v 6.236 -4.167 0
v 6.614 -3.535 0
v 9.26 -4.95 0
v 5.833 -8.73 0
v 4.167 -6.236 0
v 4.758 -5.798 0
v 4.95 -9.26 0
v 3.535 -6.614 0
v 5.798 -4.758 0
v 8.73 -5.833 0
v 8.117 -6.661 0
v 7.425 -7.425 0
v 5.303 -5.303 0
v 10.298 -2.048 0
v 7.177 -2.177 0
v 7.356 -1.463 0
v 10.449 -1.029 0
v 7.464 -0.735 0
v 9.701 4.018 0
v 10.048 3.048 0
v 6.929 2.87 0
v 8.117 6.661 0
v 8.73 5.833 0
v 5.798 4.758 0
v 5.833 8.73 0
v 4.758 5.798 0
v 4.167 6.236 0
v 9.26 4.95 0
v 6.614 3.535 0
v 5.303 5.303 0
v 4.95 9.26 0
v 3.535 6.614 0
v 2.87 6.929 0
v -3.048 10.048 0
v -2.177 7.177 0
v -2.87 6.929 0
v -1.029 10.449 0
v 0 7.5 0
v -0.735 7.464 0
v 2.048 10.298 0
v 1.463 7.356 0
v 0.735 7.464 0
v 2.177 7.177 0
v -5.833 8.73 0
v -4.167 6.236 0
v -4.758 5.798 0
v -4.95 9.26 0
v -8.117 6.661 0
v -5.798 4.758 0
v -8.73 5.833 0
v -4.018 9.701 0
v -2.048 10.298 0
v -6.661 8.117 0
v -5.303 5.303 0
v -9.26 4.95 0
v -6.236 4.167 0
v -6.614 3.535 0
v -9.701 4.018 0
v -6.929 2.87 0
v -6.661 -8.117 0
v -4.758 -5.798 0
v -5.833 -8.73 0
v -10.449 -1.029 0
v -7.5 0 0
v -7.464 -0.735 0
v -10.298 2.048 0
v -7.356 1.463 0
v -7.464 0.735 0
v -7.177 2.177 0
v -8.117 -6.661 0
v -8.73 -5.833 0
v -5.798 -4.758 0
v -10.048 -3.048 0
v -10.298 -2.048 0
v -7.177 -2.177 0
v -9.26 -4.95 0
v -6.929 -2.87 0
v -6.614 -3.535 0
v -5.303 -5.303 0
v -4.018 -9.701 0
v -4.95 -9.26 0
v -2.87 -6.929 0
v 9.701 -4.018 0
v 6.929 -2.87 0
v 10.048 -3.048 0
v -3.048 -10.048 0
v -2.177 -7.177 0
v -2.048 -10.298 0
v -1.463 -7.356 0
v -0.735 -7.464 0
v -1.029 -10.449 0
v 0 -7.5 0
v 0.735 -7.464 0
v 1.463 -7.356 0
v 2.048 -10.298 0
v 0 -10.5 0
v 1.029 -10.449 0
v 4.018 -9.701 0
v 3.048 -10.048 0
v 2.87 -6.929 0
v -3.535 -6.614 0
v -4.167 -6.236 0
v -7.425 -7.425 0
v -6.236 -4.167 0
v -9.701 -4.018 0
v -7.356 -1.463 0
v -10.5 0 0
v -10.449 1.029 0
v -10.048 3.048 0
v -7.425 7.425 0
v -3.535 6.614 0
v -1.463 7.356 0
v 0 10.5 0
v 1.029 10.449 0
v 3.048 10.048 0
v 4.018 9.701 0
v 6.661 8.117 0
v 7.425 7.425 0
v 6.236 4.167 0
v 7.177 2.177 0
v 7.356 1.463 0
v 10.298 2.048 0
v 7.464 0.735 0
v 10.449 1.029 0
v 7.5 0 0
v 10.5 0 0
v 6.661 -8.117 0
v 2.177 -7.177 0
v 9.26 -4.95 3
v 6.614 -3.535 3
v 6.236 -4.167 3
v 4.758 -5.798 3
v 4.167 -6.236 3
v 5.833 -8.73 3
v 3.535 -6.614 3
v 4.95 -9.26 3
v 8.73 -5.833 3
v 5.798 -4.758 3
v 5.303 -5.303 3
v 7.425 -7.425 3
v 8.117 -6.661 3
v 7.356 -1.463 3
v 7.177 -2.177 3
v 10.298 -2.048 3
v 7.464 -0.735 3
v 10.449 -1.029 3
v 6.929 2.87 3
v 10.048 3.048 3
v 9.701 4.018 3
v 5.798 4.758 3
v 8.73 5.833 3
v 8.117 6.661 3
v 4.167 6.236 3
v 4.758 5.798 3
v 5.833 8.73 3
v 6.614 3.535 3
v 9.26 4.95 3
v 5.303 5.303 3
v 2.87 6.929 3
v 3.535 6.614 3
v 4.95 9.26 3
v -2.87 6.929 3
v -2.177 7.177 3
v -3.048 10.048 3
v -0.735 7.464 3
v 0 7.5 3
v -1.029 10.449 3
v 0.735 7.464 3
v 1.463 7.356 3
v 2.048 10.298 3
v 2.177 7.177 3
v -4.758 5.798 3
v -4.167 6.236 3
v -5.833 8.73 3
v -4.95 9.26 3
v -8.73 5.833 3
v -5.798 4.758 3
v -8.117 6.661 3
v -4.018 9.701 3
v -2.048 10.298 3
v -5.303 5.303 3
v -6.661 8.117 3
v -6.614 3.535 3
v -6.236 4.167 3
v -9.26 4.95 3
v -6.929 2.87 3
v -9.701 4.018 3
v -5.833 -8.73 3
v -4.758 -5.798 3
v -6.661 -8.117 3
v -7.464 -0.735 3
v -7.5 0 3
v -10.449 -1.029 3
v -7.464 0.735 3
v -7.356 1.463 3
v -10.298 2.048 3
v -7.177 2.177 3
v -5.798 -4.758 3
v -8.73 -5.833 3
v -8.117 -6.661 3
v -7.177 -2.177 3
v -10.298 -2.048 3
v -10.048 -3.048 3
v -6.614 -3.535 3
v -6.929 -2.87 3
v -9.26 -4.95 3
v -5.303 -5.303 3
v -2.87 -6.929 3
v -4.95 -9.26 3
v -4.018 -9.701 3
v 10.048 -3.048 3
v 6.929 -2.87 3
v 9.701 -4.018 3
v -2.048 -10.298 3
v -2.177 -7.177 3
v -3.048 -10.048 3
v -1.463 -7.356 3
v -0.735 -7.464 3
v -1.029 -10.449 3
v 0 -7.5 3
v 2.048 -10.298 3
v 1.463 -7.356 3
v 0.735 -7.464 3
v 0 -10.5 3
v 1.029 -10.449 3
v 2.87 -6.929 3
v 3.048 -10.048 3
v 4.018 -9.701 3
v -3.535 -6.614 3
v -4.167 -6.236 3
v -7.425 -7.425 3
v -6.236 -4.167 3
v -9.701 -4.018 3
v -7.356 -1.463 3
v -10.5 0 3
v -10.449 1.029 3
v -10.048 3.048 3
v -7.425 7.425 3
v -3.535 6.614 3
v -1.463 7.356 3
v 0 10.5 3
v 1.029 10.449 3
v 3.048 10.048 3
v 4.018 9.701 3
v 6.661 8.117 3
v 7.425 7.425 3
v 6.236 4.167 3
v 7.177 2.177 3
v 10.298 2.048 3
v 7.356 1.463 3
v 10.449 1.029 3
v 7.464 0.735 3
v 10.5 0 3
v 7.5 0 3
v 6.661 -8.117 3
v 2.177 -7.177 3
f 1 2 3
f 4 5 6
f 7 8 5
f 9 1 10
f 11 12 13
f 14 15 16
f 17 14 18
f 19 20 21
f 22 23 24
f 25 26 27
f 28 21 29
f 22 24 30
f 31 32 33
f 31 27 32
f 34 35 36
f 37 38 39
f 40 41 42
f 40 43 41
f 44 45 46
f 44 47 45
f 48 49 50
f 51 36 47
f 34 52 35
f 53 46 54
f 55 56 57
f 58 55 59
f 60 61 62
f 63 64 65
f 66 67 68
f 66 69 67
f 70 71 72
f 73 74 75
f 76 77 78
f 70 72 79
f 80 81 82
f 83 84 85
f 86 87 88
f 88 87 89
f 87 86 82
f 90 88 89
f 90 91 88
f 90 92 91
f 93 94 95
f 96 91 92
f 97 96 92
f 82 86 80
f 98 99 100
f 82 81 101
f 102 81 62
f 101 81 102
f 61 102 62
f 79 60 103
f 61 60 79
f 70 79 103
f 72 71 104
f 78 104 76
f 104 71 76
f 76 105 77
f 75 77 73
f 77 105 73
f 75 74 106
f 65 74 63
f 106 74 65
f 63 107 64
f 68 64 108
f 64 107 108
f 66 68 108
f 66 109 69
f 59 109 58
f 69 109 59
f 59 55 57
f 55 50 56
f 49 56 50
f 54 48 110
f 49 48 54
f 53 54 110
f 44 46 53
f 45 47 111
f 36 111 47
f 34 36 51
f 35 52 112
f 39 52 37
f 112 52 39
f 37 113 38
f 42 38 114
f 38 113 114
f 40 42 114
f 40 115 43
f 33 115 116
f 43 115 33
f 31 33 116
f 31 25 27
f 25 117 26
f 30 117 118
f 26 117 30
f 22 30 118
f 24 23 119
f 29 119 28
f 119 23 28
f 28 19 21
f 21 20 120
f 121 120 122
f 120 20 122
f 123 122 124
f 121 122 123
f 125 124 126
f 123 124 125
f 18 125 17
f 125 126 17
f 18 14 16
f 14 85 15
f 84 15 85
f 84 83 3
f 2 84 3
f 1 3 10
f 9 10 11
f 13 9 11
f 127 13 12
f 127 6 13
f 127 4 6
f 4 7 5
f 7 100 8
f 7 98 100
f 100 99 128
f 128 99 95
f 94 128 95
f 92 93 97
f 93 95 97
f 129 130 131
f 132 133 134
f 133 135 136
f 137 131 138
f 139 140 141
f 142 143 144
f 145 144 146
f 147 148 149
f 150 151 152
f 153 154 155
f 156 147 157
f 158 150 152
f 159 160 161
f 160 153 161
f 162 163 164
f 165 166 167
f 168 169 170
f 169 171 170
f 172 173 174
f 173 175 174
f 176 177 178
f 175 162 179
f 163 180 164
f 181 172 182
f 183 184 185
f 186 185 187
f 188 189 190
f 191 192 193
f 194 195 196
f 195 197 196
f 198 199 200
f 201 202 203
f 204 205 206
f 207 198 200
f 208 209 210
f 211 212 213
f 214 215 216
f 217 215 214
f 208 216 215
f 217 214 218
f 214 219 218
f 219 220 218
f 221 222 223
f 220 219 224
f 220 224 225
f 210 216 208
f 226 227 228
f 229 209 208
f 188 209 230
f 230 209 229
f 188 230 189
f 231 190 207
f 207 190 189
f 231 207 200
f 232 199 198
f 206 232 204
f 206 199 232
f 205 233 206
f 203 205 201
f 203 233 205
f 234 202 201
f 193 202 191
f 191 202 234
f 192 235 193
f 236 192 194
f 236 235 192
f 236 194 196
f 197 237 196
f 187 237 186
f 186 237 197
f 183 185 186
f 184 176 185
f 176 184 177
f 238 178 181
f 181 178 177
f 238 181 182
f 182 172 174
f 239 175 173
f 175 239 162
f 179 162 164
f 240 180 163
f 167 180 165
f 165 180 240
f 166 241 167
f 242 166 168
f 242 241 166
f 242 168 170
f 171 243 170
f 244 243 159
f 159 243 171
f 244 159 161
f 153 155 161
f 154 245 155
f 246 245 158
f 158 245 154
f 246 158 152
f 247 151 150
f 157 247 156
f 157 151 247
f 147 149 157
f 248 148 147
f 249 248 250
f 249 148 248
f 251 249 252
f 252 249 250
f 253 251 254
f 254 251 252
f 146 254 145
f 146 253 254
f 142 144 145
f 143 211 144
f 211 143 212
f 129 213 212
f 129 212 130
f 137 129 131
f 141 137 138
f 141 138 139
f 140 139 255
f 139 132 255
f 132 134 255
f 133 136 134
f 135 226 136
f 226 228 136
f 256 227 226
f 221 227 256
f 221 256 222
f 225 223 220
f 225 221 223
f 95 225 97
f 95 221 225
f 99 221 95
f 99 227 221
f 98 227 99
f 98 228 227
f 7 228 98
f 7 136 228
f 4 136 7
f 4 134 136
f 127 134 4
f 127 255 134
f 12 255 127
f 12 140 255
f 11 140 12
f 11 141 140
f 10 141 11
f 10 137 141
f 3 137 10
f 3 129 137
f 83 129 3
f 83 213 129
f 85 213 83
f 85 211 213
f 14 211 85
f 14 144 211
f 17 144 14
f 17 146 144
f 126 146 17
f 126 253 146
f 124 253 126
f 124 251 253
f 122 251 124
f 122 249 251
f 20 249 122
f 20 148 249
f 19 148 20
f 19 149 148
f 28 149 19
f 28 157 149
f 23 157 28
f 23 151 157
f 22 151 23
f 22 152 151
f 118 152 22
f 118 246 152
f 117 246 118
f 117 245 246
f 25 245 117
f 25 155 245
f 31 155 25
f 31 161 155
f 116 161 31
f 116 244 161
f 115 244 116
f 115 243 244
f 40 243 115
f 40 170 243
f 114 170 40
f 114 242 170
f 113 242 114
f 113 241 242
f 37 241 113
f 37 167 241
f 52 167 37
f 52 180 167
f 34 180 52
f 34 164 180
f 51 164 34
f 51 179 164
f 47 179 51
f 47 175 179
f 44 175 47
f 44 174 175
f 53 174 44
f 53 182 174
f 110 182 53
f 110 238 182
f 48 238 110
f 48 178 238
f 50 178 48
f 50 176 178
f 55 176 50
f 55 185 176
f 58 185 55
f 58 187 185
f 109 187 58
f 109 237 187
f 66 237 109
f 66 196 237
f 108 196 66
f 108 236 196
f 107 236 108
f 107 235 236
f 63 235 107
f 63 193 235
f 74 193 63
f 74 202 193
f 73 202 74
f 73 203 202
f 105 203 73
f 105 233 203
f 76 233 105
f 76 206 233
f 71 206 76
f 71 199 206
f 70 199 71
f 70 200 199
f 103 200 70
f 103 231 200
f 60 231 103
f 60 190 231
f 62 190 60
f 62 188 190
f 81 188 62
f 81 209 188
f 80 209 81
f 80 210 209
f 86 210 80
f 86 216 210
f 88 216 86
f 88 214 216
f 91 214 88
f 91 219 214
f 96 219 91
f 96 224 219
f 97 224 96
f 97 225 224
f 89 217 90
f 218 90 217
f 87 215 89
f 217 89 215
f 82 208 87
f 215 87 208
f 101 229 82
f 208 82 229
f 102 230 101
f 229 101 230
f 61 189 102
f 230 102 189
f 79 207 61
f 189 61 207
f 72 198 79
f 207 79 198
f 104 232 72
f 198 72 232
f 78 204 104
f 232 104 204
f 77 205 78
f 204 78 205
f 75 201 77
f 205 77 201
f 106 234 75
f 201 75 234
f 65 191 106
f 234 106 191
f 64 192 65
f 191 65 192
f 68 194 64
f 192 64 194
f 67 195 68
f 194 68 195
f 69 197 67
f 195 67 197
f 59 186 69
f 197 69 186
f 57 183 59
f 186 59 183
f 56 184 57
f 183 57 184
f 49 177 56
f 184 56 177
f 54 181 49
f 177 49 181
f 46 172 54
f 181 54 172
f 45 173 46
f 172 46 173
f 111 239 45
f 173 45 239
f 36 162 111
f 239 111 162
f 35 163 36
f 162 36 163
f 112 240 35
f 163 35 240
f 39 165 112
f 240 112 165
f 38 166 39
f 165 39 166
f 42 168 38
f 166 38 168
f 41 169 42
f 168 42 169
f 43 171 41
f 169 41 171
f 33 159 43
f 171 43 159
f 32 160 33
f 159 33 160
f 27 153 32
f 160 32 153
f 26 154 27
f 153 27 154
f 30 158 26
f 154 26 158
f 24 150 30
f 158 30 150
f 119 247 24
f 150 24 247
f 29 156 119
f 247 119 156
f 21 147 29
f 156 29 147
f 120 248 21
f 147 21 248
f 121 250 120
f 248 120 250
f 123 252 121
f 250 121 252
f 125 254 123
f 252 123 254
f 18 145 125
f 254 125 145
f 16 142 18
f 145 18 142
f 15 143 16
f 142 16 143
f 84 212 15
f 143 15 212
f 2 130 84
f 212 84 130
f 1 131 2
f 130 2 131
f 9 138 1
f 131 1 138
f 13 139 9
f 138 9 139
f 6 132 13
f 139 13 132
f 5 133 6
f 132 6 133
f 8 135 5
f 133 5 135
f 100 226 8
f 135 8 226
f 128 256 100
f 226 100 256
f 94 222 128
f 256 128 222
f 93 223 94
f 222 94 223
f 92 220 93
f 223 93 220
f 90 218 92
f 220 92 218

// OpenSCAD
// =====================================================================
// Eyelet Generator — Parametric Model Maker (PMM) Compatible
// Generates various eyelet types for outdoor & camping gear
//
// Author: Vilda (Vilém Kužel) & Klepeto
// License: CC-BY-SA-4.0
// Repository: https://github.com/vildakuzel/openscad-eyelet-generator
// =====================================================================

/* [Eyelet Type] */
// Select eyelet type
eyelet_type = 1; // [1:Simple O, 2:Simple 8, 3:Double O Egg, 4:Snowman, 5:Triangle, 6:Joined 8, 7:Joined Snowman, 8:Simple D, 9:Double D, 10:Simple S]

/* [Dimensions] */
// Wall thickness — thickness of the eyelet ring wall
wall_thickness = 3; // [1:1:10]

// Height — extrusion height of the eyelet
height = 3; // [1:1:10]

// Base inner diameter — inner diameter of the primary ring
base_o_diameter = 15; // [1:1:150]

// Second inner diameter — inner diameter of the second ring (Simple 8, Double O Egg, Snowman, Triangle, Joined 8, Simple S)
second_o_diameter = 5; // [1:1:150]

// Third inner diameter — inner diameter of the third ring (Snowman, Triangle)
third_o_diameter = 10; // [1:1:150]

/* [3D Edge Filleting] */
// Bottom edge radius — rounds the bottom edge of the eyelet
bottom_edge_fillet = 0; // [0:0.1:10]

// Top edge radius — rounds the top edge of the eyelet
top_edge_fillet = 0; // [0:0.1:10]

// Fillet resolution — number of layers for edge rounding (higher = smoother, slower)
fillet_steps = 10; // [1:1:30]

/* [2D Smoothing] */
// Connection fillet radius — rounds V-junctions where rings meet
fillet_radius = 2; // [0:0.1:10]

/* [S Shape — Hook 1] */
// Hook 1 — percentage of a full circle (larger = more closed loop)
s_arc_1_pct = 83; // [70:1:100]

/* [S Shape — Hook 2] */
// Hook 2 — percentage of a full circle (larger = more closed loop)
s_arc_2_pct = 83; // [70:1:100]

/* [Color] */
// Eyelet color
eyelet_color = "#2F80ED"; // color

/* [Hidden] */
$fn = 64;

// Derived radius values
inner_radius = base_o_diameter / 2;
outer_radius = inner_radius + wall_thickness;

second_inner_radius = second_o_diameter / 2;
second_outer_radius = second_inner_radius + wall_thickness;

third_inner_radius = third_o_diameter / 2;
third_outer_radius = third_inner_radius + wall_thickness;

// Ring center offsets (outer edges touching)
ring_offset_1 = inner_radius + wall_thickness + second_inner_radius;
ring_offset_2 = ring_offset_1 + second_inner_radius + wall_thickness + third_inner_radius;

// Joined offsets (centers closer, inner holes connected)
joined_offset_1 = inner_radius + second_inner_radius - wall_thickness;
joined_offset_2 = joined_offset_1 + second_inner_radius + third_inner_radius - wall_thickness;

// Triangle layout — pairwise distances and vertex coordinates
d12 = inner_radius + wall_thickness + second_inner_radius;
d13 = inner_radius + wall_thickness + third_inner_radius;
d23 = second_inner_radius + wall_thickness + third_inner_radius;
tri_x = (d12*d12 + d13*d13 - d23*d23) / (2 * d12);
tri_y = sqrt(max(0, d13*d13 - tri_x*tri_x));

// =====================================================================
// Geometry Helpers
// =====================================================================

// Smooth concave V-junctions by shrinking then growing the shape.
// Use on union() of touching circles to round the inner V where they meet.
// offset(-r) cuts the V tip, offset(+r) restores with a rounded curve.
module smooth_concave(r) {
    if (r > 0) { offset(r = -r) offset(r = r) children(); }
    else { children(); }
}

// Smooth convex sharp tips by growing then shrinking the shape.
// Use on shapes with outward-pointing corners (e.g. D-shape junctions).
// offset(+r) rounds the tip outward, offset(-r) shrinks back to size.
module smooth_convex(r) {
    if (r > 0) { offset(r = r) offset(r = -r) children(); }
    else { children(); }
}

// Simple ring (annulus) — outer cylinder minus inner cylinder
module ring(r_outer, r_inner, h) {
    difference() {
        cylinder(h = h, r = r_outer);
        translate([0, 0, -1]) cylinder(h = h + 2, r = r_inner);
    }
}

// Layered extrusion with independent top and bottom edge fillets.
// Takes a 2D children() shape and extrudes it with rounded top/bottom edges.
// Uses layered linear_extrude with cosine-eased 2D offset() per layer.
module stepped_fillet_extrusion(h, bot_r, top_r, steps) {
    safe_bot = min(bot_r, h / 2);
    safe_top = min(top_r, h / 2);
    mid_h = h - safe_bot - safe_top;

    if (safe_bot == 0 && safe_top == 0) {
        linear_extrude(h) children();
    } else {
        // Bottom fillet — profile shrinks toward the bottom edge
        if (safe_bot > 0)
            for (i = [0 : steps - 1]) {
                z_start = i * safe_bot / steps;
                z_end = z_start + safe_bot / steps;
                z_mid = (z_start + z_end) / 2;
                t = z_mid / safe_bot;
                off = safe_bot * (1 - sin(t * 90));
                translate([0, 0, z_start])
                    linear_extrude(safe_bot / steps + 0.001)
                        offset(r = -off) children();
            }
        // Middle zone — full profile, no offset
        if (mid_h > 0)
            translate([0, 0, safe_bot])
                linear_extrude(mid_h + 0.001) children();
        // Top fillet — mirrored bottom fillet for convex rounding
        if (safe_top > 0)
            mirror([0, 0, 1])
                translate([0, 0, -h])
                for (i = [0 : steps - 1]) {
                    z_start = i * safe_top / steps;
                    z_end = z_start + safe_top / steps;
                    z_mid = (z_start + z_end) / 2;
                    t = z_mid / safe_top;
                    off = safe_top * (1 - sin(t * 90));
                    translate([0, 0, z_start])
                        linear_extrude(safe_top / steps + 0.001)
                            offset(r = -off) children();
                }
    }
}

// Generate points along a circular arc (used for S-shape polygon paths)
function arc_points(center, r, start_angle, direction, sweep, n = 48) =
    [for (i = [0 : n]) let(a = start_angle + direction * sweep * i / n)
        [center[0] + r * cos(a), center[1] + r * sin(a)]];

// =====================================================================
// Eyelet Types
// =====================================================================

// Type 1: Simple O — a single ring with inner and outer diameter
module simple_o_eyelet() {
    stepped_fillet_extrusion(height, bottom_edge_fillet, top_edge_fillet, fillet_steps)
    difference() { circle(r = outer_radius); circle(r = inner_radius); }
}

// Type 2: Simple 8 — two rings side by side, outer edges touching
// Connection fillet smooths the V-junction on the outer perimeter
module simple_8_eyelet() {
    stepped_fillet_extrusion(height, bottom_edge_fillet, top_edge_fillet, fillet_steps)
    difference() {
        smooth_concave(fillet_radius)
        union() {
            circle(r = outer_radius);
            translate([ring_offset_1, 0]) circle(r = second_outer_radius);
        }
        circle(r = inner_radius);
        translate([ring_offset_1, 0]) circle(r = second_inner_radius);
    }
}

// Type 3: Double O Egg — two rings inside a smooth egg-shaped envelope
// hull() creates a tangent bridge between the two outer circles
module double_o_egg_eyelet() {
    stepped_fillet_extrusion(height, bottom_edge_fillet, top_edge_fillet, fillet_steps)
    difference() {
        hull() {
            circle(r = outer_radius);
            translate([ring_offset_1, 0]) circle(r = second_outer_radius);
        }
        circle(r = inner_radius);
        translate([ring_offset_1, 0]) circle(r = second_inner_radius);
    }
}

// Type 4: Snowman — three rings in a row, outer edges touching
module snowman_eyelet() {
    stepped_fillet_extrusion(height, bottom_edge_fillet, top_edge_fillet, fillet_steps)
    difference() {
        smooth_concave(fillet_radius)
        union() {
            circle(r = outer_radius);
            translate([ring_offset_1, 0]) circle(r = second_outer_radius);
            translate([ring_offset_2, 0]) circle(r = third_outer_radius);
        }
        circle(r = inner_radius);
        translate([ring_offset_1, 0]) circle(r = second_inner_radius);
        translate([ring_offset_2, 0]) circle(r = third_inner_radius);
    }
}

// Type 5: Triangle — three rings at triangle vertices, outer edges touching
// Ring positions computed via law of cosines from pairwise distances
module triangle_eyelet() {
    stepped_fillet_extrusion(height, bottom_edge_fillet, top_edge_fillet, fillet_steps)
    difference() {
        smooth_concave(fillet_radius)
        union() {
            circle(r = outer_radius);
            translate([d12, 0]) circle(r = second_outer_radius);
            translate([tri_x, tri_y]) circle(r = third_outer_radius);
        }
        circle(r = inner_radius);
        translate([d12, 0]) circle(r = second_inner_radius);
        translate([tri_x, tri_y]) circle(r = third_inner_radius);
    }
}

// Type 6: Joined 8 — two rings with centers closer, inner holes connected
// Fillet applied to both outer and inner junctions
module joined_8_eyelet() {
    stepped_fillet_extrusion(height, bottom_edge_fillet, top_edge_fillet, fillet_steps)
    difference() {
        smooth_concave(fillet_radius)
        union() {
            circle(r = outer_radius);
            translate([joined_offset_1, 0]) circle(r = second_outer_radius);
        }
        smooth_concave(fillet_radius)
        union() {
            circle(r = inner_radius);
            translate([joined_offset_1, 0]) circle(r = second_inner_radius);
        }
    }
}

// Type 7: Joined Snowman — three rings in a row, inner holes connected
module joined_snowman_eyelet() {
    stepped_fillet_extrusion(height, bottom_edge_fillet, top_edge_fillet, fillet_steps)
    difference() {
        smooth_concave(fillet_radius)
        union() {
            circle(r = outer_radius);
            translate([joined_offset_1, 0]) circle(r = second_outer_radius);
            translate([joined_offset_2, 0]) circle(r = third_outer_radius);
        }
        smooth_concave(fillet_radius)
        union() {
            circle(r = inner_radius);
            translate([joined_offset_1, 0]) circle(r = second_inner_radius);
            translate([joined_offset_2, 0]) circle(r = third_inner_radius);
        }
    }
}

// Type 8: Simple D — half ring with a flat closing wall (D-shape)
// Convex fillet rounds the corners where the curve meets the flat wall
module simple_d_eyelet() {
    eps = 0.01;
    stepped_fillet_extrusion(height, bottom_edge_fillet, top_edge_fillet, fillet_steps)
    difference() {
        smooth_convex(fillet_radius)
        union() {
            // Right half of outer circle
            intersection() {
                circle(r = outer_radius);
                translate([-eps, -outer_radius - 1])
                    square([outer_radius + 1 + eps, (outer_radius + 1) * 2]);
            }
            // Flat closing wall on the left
            translate([-wall_thickness, -outer_radius])
                square([wall_thickness + eps, outer_radius * 2]);
        }
        // Right half of inner hole
        smooth_convex(fillet_radius)
        intersection() {
            circle(r = inner_radius);
            translate([0, -inner_radius - 1])
                square([inner_radius + 1, (inner_radius + 1) * 2]);
        }
    }
}

// Type 9: Double D — ring split in half by a center dividing wall
// Two D-shaped openings with wall_thickness gap between them
module double_d_eyelet() {
    stepped_fillet_extrusion(height, bottom_edge_fillet, top_edge_fillet, fillet_steps)
    difference() {
        circle(r = outer_radius);
        // Left half of inner hole
        smooth_convex(fillet_radius)
        intersection() {
            circle(r = inner_radius);
            translate([-inner_radius - 1, -inner_radius - 1])
                square([inner_radius + 1 - wall_thickness / 2, inner_radius * 2 + 2]);
        }
        // Right half of inner hole
        smooth_convex(fillet_radius)
        intersection() {
            circle(r = inner_radius);
            translate([wall_thickness / 2, -inner_radius - 1])
                square([inner_radius + 1, inner_radius * 2 + 2]);
        }
    }
}

// Type 10: Simple S — S-shaped curve made of two arcs sharing a point
// Each arc is a partial circle (70–100%), built as hull() of circles along the path
// Arc 1 curves left-up, Arc 2 curves right-down, forming an S-shape
module simple_s_eyelet() {
    tube_radius = wall_thickness / 2;
    step = 4; // Angular step in degrees

    // Curve radius = inner_radius + tube_radius (so inner edge = inner_radius, outer = inner_radius + wall_thickness)
    curve_r1 = inner_radius + tube_radius;
    curve_r2 = second_inner_radius + tube_radius;

    // Convert percentage to sweep angle
    arc_1_angle = s_arc_1_pct / 100 * 360;
    arc_2_angle = s_arc_2_pct / 100 * 360;

    stepped_fillet_extrusion(height, bottom_edge_fillet, top_edge_fillet, fillet_steps)
    union() {
        // Hook 1: curve to the left and up (center at [-curve_r1, 0])
        for (i = [0 : step : arc_1_angle - step]) {
            hull() {
                translate([-curve_r1 + curve_r1 * cos(i), curve_r1 * sin(i)])
                    circle(r = tube_radius);
                translate([-curve_r1 + curve_r1 * cos(i + step), curve_r1 * sin(i + step)])
                    circle(r = tube_radius);
            }
        }
        // Hook 2: curve to the right and down (center at [curve_r2, 0])
        for (i = [180 : step : 180 + arc_2_angle - step]) {
            hull() {
                translate([curve_r2 + curve_r2 * cos(i), curve_r2 * sin(i)])
                    circle(r = tube_radius);
                translate([curve_r2 + curve_r2 * cos(i + step), curve_r2 * sin(i + step)])
                    circle(r = tube_radius);
            }
        }
    }
}

// =====================================================================
// Output — route by eyelet type
// =====================================================================

color(eyelet_color)
    if (eyelet_type == 1) { simple_o_eyelet(); }
    else if (eyelet_type == 2) { simple_8_eyelet(); }
    else if (eyelet_type == 3) { double_o_egg_eyelet(); }
    else if (eyelet_type == 4) { snowman_eyelet(); }
    else if (eyelet_type == 5) { triangle_eyelet(); }
    else if (eyelet_type == 6) { joined_8_eyelet(); }
    else if (eyelet_type == 7) { joined_snowman_eyelet(); }
    else if (eyelet_type == 8) { simple_d_eyelet(); }
    else if (eyelet_type == 9) { double_d_eyelet(); }
    else if (eyelet_type == 10) { simple_s_eyelet(); }
